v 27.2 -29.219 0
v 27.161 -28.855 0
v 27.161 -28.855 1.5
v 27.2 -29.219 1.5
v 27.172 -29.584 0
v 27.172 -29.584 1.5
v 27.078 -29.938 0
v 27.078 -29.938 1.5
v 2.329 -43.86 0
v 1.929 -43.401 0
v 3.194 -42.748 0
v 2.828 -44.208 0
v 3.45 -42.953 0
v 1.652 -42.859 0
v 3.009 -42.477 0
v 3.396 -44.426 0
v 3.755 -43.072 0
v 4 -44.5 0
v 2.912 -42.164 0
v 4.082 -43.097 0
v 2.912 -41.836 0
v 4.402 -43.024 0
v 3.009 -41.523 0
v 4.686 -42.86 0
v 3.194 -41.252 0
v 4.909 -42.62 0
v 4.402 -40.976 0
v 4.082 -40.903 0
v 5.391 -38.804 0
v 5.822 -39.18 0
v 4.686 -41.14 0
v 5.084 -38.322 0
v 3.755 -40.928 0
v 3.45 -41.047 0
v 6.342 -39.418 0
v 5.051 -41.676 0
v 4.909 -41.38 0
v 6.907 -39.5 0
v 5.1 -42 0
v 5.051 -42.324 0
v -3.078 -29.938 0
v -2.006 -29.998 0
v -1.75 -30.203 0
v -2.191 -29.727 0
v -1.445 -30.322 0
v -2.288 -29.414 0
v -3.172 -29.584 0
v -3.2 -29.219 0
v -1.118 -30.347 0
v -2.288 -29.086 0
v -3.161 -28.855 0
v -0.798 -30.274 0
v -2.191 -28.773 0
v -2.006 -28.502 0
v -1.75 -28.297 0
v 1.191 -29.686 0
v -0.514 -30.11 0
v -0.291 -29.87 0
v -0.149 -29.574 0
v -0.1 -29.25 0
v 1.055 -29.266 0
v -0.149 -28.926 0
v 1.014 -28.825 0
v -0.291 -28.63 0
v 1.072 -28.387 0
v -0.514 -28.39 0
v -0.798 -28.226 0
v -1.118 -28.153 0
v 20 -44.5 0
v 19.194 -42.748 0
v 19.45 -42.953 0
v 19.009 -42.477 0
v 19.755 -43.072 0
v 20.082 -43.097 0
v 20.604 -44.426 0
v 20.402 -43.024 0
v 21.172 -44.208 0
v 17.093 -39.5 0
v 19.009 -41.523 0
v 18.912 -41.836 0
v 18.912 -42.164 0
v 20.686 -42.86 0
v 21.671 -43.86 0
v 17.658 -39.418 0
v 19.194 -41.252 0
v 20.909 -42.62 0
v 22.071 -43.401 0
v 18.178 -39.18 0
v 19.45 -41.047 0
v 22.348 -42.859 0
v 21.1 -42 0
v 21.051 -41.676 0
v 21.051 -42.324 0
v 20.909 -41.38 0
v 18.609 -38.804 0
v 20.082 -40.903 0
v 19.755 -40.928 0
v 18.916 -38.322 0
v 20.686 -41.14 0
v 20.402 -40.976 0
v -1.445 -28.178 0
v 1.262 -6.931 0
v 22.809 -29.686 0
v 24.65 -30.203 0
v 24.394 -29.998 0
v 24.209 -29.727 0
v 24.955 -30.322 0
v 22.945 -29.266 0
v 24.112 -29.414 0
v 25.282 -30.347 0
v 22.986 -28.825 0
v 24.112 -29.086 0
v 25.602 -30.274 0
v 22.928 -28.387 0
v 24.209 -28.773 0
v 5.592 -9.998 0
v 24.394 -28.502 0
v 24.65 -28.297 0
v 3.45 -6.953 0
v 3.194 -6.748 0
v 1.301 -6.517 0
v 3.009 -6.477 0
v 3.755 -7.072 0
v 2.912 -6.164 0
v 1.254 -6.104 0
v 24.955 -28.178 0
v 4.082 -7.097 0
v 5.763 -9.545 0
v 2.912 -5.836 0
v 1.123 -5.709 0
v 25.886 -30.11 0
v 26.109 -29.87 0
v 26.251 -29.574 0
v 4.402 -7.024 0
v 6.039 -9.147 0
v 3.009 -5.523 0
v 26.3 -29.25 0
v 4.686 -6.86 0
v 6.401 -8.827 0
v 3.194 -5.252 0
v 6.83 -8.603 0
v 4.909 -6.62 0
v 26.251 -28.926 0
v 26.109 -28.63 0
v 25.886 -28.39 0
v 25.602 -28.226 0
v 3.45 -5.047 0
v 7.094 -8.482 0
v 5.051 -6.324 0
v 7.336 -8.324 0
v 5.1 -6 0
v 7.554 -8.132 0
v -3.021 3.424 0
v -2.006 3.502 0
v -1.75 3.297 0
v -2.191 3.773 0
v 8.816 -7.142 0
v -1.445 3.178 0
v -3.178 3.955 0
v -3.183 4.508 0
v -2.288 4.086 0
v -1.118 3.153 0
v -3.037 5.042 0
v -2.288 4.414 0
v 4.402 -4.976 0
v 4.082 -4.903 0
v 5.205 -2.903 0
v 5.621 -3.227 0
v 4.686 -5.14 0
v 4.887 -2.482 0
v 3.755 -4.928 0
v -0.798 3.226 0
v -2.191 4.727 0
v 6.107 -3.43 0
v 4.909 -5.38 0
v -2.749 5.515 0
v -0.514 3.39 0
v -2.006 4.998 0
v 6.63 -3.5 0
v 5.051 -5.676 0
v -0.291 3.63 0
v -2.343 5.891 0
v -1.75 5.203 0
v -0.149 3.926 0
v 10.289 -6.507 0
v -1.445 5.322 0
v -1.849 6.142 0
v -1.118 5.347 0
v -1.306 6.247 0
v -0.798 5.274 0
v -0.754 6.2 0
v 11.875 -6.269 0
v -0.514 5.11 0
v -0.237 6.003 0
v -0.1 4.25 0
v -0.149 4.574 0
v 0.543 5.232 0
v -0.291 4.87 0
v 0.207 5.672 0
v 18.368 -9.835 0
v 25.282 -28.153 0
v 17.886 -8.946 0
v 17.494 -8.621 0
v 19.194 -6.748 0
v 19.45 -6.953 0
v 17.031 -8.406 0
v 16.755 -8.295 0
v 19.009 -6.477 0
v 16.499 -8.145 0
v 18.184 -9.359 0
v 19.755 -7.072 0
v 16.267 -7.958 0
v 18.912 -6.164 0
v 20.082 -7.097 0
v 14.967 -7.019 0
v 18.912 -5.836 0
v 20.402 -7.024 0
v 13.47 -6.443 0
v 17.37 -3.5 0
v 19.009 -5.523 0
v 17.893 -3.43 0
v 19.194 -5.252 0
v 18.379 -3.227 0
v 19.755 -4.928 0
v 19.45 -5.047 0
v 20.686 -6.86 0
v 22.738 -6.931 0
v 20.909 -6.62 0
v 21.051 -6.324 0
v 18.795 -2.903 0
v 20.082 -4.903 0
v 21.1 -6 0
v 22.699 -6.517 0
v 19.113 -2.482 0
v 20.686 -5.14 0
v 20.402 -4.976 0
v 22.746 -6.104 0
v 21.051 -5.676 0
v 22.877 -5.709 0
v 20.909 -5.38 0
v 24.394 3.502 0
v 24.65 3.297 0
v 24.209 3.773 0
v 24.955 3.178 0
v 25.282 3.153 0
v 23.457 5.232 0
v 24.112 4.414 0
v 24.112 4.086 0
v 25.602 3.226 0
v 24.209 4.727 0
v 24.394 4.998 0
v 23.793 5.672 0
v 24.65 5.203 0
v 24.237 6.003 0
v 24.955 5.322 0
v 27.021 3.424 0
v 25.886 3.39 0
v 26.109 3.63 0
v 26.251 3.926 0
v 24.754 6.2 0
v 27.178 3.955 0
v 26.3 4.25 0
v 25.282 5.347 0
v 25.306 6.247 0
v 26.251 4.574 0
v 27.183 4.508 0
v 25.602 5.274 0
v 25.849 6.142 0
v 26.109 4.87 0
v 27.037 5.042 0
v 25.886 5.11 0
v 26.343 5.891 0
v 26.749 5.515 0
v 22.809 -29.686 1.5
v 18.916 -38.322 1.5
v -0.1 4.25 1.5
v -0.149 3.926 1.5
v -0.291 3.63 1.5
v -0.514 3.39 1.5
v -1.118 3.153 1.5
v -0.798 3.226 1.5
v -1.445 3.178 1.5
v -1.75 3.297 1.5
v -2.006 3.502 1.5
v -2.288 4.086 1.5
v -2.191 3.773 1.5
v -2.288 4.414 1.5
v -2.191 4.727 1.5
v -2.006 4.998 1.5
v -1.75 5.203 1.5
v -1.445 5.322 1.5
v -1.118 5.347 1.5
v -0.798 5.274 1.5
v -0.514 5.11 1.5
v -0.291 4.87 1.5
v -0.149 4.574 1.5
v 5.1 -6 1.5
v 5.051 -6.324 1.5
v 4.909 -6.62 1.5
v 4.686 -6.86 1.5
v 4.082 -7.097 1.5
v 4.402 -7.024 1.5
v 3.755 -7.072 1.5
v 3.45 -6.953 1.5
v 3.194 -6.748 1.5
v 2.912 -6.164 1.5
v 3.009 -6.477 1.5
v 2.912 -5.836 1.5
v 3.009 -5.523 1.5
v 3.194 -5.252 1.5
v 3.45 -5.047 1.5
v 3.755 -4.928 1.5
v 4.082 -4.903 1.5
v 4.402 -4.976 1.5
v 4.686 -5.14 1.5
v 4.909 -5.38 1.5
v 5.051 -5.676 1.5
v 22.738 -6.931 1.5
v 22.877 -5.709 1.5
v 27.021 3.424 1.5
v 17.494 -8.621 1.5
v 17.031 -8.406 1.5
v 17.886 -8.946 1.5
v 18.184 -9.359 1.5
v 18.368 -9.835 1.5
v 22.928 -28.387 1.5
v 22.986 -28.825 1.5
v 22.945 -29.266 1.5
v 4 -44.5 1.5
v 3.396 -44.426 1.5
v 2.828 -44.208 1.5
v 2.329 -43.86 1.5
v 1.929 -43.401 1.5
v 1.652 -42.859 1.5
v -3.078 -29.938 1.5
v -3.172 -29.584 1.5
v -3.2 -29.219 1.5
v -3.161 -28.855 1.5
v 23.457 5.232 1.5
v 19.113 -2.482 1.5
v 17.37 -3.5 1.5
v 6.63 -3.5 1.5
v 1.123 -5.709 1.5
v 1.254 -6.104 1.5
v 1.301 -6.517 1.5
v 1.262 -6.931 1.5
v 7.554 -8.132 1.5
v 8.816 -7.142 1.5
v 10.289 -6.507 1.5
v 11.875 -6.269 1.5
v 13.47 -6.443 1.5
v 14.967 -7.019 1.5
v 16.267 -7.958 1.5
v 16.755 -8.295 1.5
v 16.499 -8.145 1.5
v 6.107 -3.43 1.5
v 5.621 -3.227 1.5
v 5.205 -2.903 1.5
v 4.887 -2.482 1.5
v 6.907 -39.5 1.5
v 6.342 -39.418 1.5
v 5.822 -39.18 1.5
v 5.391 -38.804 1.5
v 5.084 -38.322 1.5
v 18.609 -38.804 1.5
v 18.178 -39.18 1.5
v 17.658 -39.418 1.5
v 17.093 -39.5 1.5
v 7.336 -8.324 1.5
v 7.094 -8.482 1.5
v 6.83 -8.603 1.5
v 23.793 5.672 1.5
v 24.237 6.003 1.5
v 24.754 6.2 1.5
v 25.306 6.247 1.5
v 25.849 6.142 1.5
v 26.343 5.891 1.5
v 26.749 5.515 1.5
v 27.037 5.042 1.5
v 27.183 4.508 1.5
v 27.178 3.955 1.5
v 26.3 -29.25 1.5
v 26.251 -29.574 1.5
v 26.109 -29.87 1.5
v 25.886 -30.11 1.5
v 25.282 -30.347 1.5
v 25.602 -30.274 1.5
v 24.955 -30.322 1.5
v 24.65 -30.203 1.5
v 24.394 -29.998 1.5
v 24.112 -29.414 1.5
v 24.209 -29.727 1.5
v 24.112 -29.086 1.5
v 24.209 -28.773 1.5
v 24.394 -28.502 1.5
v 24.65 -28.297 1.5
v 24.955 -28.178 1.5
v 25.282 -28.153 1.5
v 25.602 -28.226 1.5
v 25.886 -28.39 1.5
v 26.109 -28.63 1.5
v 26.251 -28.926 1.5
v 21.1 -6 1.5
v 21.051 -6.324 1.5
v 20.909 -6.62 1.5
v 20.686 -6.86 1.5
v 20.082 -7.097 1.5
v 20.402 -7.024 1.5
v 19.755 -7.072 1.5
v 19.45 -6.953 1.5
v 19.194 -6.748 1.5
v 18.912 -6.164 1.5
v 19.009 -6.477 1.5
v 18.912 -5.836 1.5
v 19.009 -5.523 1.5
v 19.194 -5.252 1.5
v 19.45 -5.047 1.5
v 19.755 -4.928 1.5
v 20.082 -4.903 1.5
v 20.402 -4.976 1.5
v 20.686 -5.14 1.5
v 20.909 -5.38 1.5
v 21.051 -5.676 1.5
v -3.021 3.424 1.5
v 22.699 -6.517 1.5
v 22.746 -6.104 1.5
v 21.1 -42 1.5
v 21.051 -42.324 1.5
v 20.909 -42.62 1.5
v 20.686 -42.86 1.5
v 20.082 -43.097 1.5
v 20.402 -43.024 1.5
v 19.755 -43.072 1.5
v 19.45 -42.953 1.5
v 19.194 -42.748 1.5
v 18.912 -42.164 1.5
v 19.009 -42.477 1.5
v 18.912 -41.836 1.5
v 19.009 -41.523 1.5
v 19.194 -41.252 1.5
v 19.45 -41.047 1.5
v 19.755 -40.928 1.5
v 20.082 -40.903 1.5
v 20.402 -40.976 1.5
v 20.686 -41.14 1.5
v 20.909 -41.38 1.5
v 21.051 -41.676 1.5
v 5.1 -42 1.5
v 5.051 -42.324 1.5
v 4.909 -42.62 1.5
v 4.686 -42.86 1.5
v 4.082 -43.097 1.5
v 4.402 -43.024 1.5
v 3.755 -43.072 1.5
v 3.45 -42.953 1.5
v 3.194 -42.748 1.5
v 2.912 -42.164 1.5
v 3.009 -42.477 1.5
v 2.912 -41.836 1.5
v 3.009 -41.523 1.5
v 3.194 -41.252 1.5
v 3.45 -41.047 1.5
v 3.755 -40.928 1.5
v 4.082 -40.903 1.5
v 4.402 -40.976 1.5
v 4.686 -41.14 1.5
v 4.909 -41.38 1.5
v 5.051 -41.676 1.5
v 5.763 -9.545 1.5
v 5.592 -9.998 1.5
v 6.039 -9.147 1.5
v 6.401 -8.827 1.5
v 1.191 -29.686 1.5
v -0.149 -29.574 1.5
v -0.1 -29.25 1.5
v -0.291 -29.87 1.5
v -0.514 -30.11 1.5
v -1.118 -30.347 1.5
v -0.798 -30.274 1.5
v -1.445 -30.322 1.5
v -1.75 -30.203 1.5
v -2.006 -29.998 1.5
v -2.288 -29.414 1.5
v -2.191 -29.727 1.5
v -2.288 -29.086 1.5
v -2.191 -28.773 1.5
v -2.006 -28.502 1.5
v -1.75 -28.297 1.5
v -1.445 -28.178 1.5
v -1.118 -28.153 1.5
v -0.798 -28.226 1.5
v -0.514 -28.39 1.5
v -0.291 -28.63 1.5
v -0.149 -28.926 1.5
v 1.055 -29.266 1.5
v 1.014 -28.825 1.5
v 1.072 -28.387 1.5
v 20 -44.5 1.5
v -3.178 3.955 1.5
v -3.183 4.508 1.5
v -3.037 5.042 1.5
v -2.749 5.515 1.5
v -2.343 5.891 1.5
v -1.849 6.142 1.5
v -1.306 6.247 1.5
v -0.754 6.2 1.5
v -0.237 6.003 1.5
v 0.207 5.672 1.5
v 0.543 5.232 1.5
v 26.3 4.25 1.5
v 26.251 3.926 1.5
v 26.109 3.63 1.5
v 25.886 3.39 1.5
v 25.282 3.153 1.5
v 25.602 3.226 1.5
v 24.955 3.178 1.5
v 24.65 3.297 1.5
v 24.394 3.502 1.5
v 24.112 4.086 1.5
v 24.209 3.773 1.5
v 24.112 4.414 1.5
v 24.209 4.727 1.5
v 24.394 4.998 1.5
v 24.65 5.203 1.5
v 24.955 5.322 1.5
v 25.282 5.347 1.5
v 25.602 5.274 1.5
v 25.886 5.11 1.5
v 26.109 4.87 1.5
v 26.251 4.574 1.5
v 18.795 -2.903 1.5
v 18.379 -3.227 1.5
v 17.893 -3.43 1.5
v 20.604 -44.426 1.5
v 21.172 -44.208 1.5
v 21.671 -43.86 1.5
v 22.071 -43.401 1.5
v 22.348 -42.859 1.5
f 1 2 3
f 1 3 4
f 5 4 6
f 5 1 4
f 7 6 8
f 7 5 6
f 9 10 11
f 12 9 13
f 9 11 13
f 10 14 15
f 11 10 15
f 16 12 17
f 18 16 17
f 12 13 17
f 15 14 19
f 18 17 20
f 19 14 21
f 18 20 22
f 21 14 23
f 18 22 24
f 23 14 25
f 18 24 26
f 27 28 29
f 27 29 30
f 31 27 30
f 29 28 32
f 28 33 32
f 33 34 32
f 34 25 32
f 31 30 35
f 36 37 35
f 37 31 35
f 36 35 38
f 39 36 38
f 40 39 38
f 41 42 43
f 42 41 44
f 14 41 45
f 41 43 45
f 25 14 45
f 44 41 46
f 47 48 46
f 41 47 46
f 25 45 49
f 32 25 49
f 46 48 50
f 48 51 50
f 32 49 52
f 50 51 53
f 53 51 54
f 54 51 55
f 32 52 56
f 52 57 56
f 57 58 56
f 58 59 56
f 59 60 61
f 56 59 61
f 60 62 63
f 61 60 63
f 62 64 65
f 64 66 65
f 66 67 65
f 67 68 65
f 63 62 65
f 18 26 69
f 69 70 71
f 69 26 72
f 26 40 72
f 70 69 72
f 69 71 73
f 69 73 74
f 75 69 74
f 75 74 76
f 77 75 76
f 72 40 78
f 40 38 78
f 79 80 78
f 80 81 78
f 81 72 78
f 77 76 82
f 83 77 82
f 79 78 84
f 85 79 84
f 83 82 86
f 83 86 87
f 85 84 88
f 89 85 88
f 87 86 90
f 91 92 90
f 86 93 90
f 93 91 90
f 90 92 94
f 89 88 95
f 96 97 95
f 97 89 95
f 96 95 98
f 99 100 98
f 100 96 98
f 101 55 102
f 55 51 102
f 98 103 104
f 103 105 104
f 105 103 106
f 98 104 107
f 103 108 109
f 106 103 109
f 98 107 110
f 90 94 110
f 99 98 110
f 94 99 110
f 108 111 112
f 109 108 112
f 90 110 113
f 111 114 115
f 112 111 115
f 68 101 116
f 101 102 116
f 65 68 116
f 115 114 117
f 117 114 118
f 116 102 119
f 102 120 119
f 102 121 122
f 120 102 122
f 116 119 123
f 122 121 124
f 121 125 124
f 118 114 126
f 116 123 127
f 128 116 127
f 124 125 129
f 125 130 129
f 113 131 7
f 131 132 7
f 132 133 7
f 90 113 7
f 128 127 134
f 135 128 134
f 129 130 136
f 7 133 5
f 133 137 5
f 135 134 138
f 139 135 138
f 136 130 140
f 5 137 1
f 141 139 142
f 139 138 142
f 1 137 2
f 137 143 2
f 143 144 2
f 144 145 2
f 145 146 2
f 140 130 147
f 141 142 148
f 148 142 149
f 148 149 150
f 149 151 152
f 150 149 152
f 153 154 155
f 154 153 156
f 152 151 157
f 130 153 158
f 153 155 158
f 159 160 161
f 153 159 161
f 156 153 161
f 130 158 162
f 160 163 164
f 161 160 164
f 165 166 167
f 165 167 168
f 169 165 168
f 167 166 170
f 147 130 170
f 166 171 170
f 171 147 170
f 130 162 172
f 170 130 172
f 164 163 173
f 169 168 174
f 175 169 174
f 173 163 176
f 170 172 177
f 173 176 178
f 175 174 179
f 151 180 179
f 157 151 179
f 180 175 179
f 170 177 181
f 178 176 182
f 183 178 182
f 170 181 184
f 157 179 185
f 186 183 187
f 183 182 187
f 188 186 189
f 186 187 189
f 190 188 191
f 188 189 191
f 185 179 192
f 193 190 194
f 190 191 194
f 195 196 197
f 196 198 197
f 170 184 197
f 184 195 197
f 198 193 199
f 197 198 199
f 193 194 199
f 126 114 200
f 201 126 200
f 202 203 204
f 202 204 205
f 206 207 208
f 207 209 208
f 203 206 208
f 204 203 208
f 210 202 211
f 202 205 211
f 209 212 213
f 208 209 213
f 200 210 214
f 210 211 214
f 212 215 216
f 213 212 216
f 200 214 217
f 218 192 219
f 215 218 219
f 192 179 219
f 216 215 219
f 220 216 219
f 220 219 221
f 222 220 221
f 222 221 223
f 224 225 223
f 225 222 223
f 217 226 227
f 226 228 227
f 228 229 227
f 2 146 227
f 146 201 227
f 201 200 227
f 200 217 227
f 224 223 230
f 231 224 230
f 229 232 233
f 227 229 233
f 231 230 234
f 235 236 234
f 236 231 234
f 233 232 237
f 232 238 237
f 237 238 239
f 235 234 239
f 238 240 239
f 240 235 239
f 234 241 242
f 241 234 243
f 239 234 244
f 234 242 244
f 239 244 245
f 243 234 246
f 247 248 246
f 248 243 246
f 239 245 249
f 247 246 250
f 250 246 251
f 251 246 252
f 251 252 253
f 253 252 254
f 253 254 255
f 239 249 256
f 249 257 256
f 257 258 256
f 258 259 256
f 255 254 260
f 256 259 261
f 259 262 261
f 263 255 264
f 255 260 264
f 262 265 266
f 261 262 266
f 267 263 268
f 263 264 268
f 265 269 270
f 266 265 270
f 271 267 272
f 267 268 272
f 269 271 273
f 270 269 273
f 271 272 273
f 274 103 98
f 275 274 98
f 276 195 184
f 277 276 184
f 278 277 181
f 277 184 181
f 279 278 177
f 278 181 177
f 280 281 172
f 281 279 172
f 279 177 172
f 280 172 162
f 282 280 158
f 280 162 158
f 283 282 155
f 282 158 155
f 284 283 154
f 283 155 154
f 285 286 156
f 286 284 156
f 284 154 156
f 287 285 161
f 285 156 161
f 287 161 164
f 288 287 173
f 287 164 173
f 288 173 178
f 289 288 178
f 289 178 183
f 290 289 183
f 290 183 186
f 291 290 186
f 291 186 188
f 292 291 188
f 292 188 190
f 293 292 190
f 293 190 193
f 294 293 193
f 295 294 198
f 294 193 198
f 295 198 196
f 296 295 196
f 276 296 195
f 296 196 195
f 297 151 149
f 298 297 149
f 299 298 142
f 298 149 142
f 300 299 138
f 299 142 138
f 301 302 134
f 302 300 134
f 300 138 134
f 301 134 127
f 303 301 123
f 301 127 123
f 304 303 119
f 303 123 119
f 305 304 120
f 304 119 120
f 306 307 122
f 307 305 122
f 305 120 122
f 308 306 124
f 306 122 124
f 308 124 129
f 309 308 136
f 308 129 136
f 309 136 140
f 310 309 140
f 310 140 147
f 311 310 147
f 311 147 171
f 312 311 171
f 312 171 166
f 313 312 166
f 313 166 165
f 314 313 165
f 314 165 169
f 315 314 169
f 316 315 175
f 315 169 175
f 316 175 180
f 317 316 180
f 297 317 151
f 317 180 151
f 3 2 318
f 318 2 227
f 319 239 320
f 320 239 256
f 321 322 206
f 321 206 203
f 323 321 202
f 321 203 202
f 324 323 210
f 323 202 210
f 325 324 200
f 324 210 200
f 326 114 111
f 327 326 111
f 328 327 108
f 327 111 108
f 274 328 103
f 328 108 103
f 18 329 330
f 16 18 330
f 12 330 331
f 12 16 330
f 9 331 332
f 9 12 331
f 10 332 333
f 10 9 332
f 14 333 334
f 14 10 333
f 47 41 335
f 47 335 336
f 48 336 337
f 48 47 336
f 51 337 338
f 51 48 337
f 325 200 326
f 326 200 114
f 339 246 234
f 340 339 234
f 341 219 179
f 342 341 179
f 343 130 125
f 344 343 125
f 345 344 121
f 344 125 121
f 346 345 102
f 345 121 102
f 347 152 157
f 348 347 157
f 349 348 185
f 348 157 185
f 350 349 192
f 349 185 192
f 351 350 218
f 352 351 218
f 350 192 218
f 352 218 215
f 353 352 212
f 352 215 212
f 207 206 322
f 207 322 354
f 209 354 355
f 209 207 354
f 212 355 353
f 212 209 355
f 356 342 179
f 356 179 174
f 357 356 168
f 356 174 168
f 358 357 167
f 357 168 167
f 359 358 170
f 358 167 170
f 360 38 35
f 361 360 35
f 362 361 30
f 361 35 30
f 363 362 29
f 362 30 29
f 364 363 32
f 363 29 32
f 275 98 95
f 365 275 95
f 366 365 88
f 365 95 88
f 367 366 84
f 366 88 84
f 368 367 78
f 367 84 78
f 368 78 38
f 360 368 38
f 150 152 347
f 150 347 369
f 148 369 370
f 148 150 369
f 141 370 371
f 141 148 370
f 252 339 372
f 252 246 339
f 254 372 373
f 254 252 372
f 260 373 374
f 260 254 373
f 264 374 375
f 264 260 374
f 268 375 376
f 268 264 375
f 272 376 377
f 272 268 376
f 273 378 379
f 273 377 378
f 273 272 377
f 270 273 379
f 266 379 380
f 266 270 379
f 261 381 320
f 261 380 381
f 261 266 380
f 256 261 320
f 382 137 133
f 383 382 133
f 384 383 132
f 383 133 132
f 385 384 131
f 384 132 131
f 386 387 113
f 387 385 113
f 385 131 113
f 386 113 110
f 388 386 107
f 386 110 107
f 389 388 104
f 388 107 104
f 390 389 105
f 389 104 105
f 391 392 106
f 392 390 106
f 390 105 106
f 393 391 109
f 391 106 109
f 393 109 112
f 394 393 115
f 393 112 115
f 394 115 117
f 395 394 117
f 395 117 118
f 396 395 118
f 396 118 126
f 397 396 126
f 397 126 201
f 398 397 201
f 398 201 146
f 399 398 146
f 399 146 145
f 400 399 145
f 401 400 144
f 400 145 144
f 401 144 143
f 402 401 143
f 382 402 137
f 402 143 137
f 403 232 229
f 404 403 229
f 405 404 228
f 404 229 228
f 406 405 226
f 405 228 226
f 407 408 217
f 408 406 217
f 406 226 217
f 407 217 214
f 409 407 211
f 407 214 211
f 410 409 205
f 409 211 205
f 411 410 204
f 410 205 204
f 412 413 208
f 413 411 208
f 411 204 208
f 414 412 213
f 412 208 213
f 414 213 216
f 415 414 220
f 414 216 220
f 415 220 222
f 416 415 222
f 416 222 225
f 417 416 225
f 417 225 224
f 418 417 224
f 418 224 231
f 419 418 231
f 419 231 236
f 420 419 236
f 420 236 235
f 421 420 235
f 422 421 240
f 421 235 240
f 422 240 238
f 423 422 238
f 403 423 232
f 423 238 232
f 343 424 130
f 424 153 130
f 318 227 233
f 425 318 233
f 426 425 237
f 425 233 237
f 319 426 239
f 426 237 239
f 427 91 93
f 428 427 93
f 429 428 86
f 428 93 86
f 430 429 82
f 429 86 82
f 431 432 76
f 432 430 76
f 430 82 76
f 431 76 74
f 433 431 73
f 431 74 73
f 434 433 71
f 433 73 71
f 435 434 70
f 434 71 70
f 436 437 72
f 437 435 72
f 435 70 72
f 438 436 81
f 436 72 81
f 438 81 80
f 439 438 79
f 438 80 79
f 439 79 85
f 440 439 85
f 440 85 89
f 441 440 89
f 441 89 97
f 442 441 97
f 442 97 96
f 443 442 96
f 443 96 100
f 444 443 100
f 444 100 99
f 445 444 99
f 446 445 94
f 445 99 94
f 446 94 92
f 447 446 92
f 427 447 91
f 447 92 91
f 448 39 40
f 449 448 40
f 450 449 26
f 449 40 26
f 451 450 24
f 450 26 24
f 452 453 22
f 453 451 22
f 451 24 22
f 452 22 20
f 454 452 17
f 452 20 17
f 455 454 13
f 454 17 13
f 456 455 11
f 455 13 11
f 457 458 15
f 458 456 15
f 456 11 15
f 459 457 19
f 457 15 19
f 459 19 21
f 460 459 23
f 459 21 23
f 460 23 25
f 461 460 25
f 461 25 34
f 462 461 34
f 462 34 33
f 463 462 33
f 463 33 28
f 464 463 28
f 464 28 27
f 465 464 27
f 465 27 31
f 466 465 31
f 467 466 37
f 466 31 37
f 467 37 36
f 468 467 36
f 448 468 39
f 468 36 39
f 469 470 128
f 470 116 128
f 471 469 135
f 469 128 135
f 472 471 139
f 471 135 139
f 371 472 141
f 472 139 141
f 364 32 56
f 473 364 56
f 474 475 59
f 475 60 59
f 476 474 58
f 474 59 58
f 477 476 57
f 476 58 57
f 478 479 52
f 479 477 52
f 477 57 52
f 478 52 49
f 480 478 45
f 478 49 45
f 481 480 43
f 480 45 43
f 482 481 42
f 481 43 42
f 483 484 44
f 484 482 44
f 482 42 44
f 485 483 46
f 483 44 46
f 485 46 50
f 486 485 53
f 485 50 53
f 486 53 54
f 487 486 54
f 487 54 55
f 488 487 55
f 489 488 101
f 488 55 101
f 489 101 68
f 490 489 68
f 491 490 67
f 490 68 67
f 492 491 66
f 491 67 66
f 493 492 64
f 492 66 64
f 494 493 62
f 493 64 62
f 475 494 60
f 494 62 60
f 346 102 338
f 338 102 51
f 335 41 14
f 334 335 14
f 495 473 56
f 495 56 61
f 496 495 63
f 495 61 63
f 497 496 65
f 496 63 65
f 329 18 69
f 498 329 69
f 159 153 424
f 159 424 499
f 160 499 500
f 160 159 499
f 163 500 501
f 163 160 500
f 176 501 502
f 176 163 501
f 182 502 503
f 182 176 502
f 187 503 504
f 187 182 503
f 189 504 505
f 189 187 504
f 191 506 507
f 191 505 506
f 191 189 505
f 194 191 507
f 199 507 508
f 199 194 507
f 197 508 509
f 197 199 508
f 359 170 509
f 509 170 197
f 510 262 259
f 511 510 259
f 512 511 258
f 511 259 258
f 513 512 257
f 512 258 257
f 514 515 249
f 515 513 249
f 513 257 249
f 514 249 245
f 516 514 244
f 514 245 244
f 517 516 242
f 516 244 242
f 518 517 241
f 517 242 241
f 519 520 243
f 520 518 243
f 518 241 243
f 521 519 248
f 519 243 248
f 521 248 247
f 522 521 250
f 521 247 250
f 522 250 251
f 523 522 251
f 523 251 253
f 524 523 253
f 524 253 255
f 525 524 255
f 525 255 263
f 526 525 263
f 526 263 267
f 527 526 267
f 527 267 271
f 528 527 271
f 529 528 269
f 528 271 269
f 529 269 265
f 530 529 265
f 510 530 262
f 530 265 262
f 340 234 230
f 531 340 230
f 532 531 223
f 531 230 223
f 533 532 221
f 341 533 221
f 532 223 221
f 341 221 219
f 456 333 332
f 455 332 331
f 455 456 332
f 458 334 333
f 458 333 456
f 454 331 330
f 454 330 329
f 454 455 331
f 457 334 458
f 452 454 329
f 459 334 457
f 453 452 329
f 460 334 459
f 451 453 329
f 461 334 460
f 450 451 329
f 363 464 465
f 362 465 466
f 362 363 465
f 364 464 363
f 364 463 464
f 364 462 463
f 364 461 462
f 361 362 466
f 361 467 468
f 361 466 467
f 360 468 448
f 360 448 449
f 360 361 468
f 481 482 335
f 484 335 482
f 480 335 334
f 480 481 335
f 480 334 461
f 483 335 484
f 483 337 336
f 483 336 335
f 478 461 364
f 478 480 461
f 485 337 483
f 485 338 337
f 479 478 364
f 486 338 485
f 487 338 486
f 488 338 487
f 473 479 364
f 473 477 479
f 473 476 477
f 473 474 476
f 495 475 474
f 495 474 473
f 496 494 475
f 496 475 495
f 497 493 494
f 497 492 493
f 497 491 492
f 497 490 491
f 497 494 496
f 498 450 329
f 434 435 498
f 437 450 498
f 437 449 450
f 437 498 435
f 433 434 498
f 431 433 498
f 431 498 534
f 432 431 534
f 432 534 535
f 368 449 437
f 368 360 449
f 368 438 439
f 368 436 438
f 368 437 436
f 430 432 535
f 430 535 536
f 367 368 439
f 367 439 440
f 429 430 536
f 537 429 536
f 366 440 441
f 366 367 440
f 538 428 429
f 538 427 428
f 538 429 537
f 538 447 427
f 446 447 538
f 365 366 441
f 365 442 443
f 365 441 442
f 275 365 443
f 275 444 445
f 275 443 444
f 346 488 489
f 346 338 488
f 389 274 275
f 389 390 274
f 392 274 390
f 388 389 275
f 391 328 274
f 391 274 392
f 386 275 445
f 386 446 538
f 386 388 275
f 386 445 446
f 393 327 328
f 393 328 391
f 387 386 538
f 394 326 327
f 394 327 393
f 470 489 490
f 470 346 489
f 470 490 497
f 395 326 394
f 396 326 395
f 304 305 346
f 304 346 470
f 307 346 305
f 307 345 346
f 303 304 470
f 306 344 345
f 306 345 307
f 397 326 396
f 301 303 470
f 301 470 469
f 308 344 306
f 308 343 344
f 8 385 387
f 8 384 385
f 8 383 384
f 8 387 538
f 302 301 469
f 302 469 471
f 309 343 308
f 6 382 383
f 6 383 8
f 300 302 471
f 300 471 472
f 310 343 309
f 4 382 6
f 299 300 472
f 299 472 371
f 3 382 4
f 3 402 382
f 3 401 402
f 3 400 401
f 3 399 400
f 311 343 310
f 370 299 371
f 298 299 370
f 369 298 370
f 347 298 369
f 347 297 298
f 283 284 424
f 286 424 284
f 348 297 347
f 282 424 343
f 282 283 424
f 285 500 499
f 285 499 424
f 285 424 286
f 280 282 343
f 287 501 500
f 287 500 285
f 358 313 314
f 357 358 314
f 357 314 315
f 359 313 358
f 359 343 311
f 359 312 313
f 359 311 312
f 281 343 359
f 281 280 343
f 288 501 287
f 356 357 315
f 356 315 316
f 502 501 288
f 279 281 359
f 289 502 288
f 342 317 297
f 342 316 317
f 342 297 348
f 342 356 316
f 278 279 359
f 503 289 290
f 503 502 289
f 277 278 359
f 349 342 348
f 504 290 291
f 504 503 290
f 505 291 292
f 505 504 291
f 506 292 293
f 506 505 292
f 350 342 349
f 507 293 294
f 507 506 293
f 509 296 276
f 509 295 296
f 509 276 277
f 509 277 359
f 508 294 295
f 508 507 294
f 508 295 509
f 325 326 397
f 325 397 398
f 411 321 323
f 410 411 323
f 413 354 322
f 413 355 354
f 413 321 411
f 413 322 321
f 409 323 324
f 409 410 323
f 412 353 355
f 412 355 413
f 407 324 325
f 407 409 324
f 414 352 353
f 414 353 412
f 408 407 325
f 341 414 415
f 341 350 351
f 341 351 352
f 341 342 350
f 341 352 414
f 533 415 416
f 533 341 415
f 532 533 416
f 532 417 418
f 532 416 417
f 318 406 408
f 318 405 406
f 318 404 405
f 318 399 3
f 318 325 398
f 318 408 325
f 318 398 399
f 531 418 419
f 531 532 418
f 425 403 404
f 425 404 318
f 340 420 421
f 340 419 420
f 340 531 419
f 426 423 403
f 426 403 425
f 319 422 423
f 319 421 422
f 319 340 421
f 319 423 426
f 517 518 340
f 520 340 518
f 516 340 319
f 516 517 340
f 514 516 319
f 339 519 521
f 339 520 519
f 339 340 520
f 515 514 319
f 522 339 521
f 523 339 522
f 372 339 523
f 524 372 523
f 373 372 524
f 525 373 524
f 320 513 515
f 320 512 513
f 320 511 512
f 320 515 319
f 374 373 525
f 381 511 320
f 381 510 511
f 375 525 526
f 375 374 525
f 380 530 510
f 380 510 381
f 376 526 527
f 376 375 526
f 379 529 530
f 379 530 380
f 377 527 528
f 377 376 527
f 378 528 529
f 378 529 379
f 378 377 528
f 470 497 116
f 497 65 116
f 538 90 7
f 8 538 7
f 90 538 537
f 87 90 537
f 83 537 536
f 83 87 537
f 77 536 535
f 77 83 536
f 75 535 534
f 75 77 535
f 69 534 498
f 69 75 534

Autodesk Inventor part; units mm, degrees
ref_plane "YZ Plane" through (0, 0, 0) normal (1, 0, 0) x (0, 1, 0)
ref_plane "XZ Plane" through (0, 0, 0) normal (0, 1, 0) x (-1, 0, 0)
ref_plane "XY Plane" through (0, 0, 0) normal (0, 0, 1) x (1, 0, 0)
sketch "スケッチ1" plane through (0, 0, 0) normal (0, 0, 1) x (1, 0, 0)
  circle A0 centre (4, -6) radius 1.05
  circle A1 centre (4, -6) radius 1.1
  circle A2 centre (20, -6) radius 1.05
  circle A3 centre (20, -42) radius 1.1
  circle A4 centre (4, -42) radius 1.05
  circle A5 centre (20, -6) radius 1.1
  circle A6 centre (20, -42) radius 1.1
  circle A7 centre (4, -42) radius 1.1
  circle A8 centre (4, -42) radius 2.5
  circle A9 centre (20, -42) radius 2.5
  circle A10 centre (20, -6) radius 2.5
  circle A11 centre (4, -6) radius 2.5
  arc A12 (-0.741742, -29.885509) -> (-0.741742, -28.614491) centre (-1.2, -29.25) ccw
  arc A13 (24.741742, -28.614491) -> (24.741742, -29.885509) centre (25.2, -29.25) ccw
  arc A14 (-0.741742, 3.614491) -> (-0.741742, 4.885509) centre (-1.2, 4.25) ccw
  arc A15 (24.741742, 4.885509) -> (24.741742, 3.614491) centre (25.2, 4.25) ccw
  line L0 (24.741742, 5.75) -> (24.741742, 4.885509)
  line L1 (24.741742, 5.75) -> (22.7, 5.75)
  line L2 (22.7, 5.75) -> (22.7, 2.75)
  line L3 (24.741742, 2.75) -> (22.7, 2.75)
  line L4 (24.741742, 3.614491) -> (24.741742, 2.75)
  circle A16 centre (-1.2, 4.25) radius 1.1
  circle A17 centre (25.2, 4.25) radius 1.1
  circle A18 centre (25.2, -29.25) radius 1.1
  circle A19 centre (-1.2, -29.25) radius 1.1
  circle A20 centre (-1.2, -29.25) radius 2
  circle A21 centre (25.2, -29.25) radius 2
  circle A22 centre (25.2, 4.25) radius 2
  circle A23 centre (-1.2, 4.25) radius 2
  line L5 (-3.078107, -29.937542) -> (1.652366, -42.859427)
  line L6 (0.623256, -28.427966) -> (6.279069, -40.972458)
  line L7 (4, -39.5) -> (20, -39.5)
  line L8 (20, -44.5) -> (4, -44.5)
  line L9 (0.742189, -29.727393) -> (6.427736, -6.596741)
  line L10 (-3.160511, -28.854531) -> (1.549361, -5.505664)
  line L11 (-3.021278, 3.423595) -> (1.723402, -7.033006)
  line L12 (6.17819, -4.773016) -> (0.542552, 5.231587)
  line L13 (4, -3.5) -> (20, -3.5)
  line L14 (20, -8.5) -> (4, -8.5)
  line L15 (17.82181, -4.773016) -> (23.457448, 5.231587)
  line L16 (27.021278, 3.423595) -> (22.276598, -7.033006)
  line L17 (17.572264, -6.596741) -> (23.257811, -29.727393)
  line L18 (27.160511, -28.854531) -> (22.450639, -5.505664)
  line L19 (23.376744, -28.427966) -> (17.720931, -40.972458)
  line L20 (27.078107, -29.937542) -> (22.347634, -42.859427)
  circle A24 centre (12, -12.5) radius 6.232545
  point P0 (0, 0)
  point P1 (5.615196, -39.5)
  point P2 (0.906933, -29.057158)
  point P3 (5.959912, -8.5)
  point P4 (18.040088, -8.5)
  point P5 (23.093067, -29.057158)
  point P6 (18.384804, -39.5)
  point P7 (18.538906, -3.5)
  point P8 (5.461094, -3.5)
  point P9 (1.389644, -6.29745)
  point P10 (22.610356, -6.29745)
  point P11 (7.220396, -8.5)
  point P12 (16.779604, -8.5)
  dimension "d0" = 2.2
  dimension "d1" = 2.2
  dimension "d2" = 2.2
  dimension "d3" = 2.2
  dimension "d4" = 5
  dimension "d5" = 5
  dimension "d6" = 5
  dimension "d7" = 5
  dimension "d8" = 2.2
  dimension "d9" = 2.2
  dimension "d10" = 2.2
  dimension "d11" = 2.2
  dimension "d12" = 4
  dimension "d13" = 4
  dimension "d14" = 4
  dimension "d15" = 4
sketch "スケッチ1 outline for 押し出し1" plane through (0, 0, 0) normal (0, 0, 1) x (1, 0, 0)
  arc A0 (27.021278, 3.423595) -> (23.457448, 5.231587) centre (25.2, 4.25) ccw
  line L0 (22.610356, -6.29745) -> (27.021278, 3.423595)
  line L1 (23.457448, 5.231587) -> (18.538906, -3.5)
  line L2 (27.160511, -28.854531) -> (22.610356, -6.29745)
  line L3 (18.538906, -3.5) -> (5.461094, -3.5)
  arc A1 (27.078107, -29.937542) -> (27.160511, -28.854531) centre (25.2, -29.25) ccw
  line L4 (5.461094, -3.5) -> (0.542552, 5.231587)
  line L5 (22.347634, -42.859427) -> (27.078107, -29.937542)
  arc A2 (0.542552, 5.231587) -> (-3.021278, 3.423595) centre (-1.2, 4.25) ccw
  arc A3 (20, -44.5) -> (22.347634, -42.859427) centre (20, -42) ccw
  line L6 (-3.021278, 3.423595) -> (1.389644, -6.29745)
  line L7 (4, -44.5) -> (20, -44.5)
  line L8 (1.389644, -6.29745) -> (-3.160511, -28.854531)
  arc A4 (1.652366, -42.859427) -> (4, -44.5) centre (4, -42) ccw
  arc A5 (-3.160511, -28.854531) -> (-3.078107, -29.937542) centre (-1.2, -29.25) ccw
  line L9 (-3.078107, -29.937542) -> (1.652366, -42.859427)
  circle A6 centre (4, -42) radius 1.1
  circle A7 centre (-1.2, -29.25) radius 1.1
  circle A8 centre (20, -42) radius 1.1
  line L10 (5.615196, -39.5) -> (0.906933, -29.057158)
  line L11 (18.384804, -39.5) -> (5.615196, -39.5)
  line L12 (23.093067, -29.057158) -> (18.384804, -39.5)
  line L13 (18.040088, -8.5) -> (23.093067, -29.057158)
  line L14 (16.779604, -8.5) -> (18.040088, -8.5)
  arc A9 (7.220396, -8.5) -> (16.779604, -8.5) centre (12, -12.5) cw
  line L15 (5.959912, -8.5) -> (7.220396, -8.5)
  line L16 (0.906933, -29.057158) -> (5.959912, -8.5)
  circle A10 centre (25.2, -29.25) radius 1.1
  circle A11 centre (4, -6) radius 1.1
  circle A12 centre (-1.2, 4.25) radius 1.1
  circle A13 centre (20, -6) radius 1.1
  circle A14 centre (25.2, 4.25) radius 1.1
extrude "押し出し1" add sketch "スケッチ1 outline for 押し出し1" along normal blind 1.5
fillet "フィレット1" radius 2 12 edges at (0.9069, -29.0572, 0.75) (5.6152, -39.5, 0.75) (18.3848, -39.5, 0.75) (23.0931, -29.0572, 0.75) (18.0401, -8.5, 0.75) (5.9599, -8.5, 0.75) (7.2204, -8.5, 0.75) (16.7796, -8.5, 0.75) (5.4611, -3.5, 0.75) (18.5389, -3.5, 0.75) (1.3896, -6.2975, 0.75) (22.6104, -6.2975, 0.75)
properties part number "matasita" material "アルミニウム 2014-T4"
